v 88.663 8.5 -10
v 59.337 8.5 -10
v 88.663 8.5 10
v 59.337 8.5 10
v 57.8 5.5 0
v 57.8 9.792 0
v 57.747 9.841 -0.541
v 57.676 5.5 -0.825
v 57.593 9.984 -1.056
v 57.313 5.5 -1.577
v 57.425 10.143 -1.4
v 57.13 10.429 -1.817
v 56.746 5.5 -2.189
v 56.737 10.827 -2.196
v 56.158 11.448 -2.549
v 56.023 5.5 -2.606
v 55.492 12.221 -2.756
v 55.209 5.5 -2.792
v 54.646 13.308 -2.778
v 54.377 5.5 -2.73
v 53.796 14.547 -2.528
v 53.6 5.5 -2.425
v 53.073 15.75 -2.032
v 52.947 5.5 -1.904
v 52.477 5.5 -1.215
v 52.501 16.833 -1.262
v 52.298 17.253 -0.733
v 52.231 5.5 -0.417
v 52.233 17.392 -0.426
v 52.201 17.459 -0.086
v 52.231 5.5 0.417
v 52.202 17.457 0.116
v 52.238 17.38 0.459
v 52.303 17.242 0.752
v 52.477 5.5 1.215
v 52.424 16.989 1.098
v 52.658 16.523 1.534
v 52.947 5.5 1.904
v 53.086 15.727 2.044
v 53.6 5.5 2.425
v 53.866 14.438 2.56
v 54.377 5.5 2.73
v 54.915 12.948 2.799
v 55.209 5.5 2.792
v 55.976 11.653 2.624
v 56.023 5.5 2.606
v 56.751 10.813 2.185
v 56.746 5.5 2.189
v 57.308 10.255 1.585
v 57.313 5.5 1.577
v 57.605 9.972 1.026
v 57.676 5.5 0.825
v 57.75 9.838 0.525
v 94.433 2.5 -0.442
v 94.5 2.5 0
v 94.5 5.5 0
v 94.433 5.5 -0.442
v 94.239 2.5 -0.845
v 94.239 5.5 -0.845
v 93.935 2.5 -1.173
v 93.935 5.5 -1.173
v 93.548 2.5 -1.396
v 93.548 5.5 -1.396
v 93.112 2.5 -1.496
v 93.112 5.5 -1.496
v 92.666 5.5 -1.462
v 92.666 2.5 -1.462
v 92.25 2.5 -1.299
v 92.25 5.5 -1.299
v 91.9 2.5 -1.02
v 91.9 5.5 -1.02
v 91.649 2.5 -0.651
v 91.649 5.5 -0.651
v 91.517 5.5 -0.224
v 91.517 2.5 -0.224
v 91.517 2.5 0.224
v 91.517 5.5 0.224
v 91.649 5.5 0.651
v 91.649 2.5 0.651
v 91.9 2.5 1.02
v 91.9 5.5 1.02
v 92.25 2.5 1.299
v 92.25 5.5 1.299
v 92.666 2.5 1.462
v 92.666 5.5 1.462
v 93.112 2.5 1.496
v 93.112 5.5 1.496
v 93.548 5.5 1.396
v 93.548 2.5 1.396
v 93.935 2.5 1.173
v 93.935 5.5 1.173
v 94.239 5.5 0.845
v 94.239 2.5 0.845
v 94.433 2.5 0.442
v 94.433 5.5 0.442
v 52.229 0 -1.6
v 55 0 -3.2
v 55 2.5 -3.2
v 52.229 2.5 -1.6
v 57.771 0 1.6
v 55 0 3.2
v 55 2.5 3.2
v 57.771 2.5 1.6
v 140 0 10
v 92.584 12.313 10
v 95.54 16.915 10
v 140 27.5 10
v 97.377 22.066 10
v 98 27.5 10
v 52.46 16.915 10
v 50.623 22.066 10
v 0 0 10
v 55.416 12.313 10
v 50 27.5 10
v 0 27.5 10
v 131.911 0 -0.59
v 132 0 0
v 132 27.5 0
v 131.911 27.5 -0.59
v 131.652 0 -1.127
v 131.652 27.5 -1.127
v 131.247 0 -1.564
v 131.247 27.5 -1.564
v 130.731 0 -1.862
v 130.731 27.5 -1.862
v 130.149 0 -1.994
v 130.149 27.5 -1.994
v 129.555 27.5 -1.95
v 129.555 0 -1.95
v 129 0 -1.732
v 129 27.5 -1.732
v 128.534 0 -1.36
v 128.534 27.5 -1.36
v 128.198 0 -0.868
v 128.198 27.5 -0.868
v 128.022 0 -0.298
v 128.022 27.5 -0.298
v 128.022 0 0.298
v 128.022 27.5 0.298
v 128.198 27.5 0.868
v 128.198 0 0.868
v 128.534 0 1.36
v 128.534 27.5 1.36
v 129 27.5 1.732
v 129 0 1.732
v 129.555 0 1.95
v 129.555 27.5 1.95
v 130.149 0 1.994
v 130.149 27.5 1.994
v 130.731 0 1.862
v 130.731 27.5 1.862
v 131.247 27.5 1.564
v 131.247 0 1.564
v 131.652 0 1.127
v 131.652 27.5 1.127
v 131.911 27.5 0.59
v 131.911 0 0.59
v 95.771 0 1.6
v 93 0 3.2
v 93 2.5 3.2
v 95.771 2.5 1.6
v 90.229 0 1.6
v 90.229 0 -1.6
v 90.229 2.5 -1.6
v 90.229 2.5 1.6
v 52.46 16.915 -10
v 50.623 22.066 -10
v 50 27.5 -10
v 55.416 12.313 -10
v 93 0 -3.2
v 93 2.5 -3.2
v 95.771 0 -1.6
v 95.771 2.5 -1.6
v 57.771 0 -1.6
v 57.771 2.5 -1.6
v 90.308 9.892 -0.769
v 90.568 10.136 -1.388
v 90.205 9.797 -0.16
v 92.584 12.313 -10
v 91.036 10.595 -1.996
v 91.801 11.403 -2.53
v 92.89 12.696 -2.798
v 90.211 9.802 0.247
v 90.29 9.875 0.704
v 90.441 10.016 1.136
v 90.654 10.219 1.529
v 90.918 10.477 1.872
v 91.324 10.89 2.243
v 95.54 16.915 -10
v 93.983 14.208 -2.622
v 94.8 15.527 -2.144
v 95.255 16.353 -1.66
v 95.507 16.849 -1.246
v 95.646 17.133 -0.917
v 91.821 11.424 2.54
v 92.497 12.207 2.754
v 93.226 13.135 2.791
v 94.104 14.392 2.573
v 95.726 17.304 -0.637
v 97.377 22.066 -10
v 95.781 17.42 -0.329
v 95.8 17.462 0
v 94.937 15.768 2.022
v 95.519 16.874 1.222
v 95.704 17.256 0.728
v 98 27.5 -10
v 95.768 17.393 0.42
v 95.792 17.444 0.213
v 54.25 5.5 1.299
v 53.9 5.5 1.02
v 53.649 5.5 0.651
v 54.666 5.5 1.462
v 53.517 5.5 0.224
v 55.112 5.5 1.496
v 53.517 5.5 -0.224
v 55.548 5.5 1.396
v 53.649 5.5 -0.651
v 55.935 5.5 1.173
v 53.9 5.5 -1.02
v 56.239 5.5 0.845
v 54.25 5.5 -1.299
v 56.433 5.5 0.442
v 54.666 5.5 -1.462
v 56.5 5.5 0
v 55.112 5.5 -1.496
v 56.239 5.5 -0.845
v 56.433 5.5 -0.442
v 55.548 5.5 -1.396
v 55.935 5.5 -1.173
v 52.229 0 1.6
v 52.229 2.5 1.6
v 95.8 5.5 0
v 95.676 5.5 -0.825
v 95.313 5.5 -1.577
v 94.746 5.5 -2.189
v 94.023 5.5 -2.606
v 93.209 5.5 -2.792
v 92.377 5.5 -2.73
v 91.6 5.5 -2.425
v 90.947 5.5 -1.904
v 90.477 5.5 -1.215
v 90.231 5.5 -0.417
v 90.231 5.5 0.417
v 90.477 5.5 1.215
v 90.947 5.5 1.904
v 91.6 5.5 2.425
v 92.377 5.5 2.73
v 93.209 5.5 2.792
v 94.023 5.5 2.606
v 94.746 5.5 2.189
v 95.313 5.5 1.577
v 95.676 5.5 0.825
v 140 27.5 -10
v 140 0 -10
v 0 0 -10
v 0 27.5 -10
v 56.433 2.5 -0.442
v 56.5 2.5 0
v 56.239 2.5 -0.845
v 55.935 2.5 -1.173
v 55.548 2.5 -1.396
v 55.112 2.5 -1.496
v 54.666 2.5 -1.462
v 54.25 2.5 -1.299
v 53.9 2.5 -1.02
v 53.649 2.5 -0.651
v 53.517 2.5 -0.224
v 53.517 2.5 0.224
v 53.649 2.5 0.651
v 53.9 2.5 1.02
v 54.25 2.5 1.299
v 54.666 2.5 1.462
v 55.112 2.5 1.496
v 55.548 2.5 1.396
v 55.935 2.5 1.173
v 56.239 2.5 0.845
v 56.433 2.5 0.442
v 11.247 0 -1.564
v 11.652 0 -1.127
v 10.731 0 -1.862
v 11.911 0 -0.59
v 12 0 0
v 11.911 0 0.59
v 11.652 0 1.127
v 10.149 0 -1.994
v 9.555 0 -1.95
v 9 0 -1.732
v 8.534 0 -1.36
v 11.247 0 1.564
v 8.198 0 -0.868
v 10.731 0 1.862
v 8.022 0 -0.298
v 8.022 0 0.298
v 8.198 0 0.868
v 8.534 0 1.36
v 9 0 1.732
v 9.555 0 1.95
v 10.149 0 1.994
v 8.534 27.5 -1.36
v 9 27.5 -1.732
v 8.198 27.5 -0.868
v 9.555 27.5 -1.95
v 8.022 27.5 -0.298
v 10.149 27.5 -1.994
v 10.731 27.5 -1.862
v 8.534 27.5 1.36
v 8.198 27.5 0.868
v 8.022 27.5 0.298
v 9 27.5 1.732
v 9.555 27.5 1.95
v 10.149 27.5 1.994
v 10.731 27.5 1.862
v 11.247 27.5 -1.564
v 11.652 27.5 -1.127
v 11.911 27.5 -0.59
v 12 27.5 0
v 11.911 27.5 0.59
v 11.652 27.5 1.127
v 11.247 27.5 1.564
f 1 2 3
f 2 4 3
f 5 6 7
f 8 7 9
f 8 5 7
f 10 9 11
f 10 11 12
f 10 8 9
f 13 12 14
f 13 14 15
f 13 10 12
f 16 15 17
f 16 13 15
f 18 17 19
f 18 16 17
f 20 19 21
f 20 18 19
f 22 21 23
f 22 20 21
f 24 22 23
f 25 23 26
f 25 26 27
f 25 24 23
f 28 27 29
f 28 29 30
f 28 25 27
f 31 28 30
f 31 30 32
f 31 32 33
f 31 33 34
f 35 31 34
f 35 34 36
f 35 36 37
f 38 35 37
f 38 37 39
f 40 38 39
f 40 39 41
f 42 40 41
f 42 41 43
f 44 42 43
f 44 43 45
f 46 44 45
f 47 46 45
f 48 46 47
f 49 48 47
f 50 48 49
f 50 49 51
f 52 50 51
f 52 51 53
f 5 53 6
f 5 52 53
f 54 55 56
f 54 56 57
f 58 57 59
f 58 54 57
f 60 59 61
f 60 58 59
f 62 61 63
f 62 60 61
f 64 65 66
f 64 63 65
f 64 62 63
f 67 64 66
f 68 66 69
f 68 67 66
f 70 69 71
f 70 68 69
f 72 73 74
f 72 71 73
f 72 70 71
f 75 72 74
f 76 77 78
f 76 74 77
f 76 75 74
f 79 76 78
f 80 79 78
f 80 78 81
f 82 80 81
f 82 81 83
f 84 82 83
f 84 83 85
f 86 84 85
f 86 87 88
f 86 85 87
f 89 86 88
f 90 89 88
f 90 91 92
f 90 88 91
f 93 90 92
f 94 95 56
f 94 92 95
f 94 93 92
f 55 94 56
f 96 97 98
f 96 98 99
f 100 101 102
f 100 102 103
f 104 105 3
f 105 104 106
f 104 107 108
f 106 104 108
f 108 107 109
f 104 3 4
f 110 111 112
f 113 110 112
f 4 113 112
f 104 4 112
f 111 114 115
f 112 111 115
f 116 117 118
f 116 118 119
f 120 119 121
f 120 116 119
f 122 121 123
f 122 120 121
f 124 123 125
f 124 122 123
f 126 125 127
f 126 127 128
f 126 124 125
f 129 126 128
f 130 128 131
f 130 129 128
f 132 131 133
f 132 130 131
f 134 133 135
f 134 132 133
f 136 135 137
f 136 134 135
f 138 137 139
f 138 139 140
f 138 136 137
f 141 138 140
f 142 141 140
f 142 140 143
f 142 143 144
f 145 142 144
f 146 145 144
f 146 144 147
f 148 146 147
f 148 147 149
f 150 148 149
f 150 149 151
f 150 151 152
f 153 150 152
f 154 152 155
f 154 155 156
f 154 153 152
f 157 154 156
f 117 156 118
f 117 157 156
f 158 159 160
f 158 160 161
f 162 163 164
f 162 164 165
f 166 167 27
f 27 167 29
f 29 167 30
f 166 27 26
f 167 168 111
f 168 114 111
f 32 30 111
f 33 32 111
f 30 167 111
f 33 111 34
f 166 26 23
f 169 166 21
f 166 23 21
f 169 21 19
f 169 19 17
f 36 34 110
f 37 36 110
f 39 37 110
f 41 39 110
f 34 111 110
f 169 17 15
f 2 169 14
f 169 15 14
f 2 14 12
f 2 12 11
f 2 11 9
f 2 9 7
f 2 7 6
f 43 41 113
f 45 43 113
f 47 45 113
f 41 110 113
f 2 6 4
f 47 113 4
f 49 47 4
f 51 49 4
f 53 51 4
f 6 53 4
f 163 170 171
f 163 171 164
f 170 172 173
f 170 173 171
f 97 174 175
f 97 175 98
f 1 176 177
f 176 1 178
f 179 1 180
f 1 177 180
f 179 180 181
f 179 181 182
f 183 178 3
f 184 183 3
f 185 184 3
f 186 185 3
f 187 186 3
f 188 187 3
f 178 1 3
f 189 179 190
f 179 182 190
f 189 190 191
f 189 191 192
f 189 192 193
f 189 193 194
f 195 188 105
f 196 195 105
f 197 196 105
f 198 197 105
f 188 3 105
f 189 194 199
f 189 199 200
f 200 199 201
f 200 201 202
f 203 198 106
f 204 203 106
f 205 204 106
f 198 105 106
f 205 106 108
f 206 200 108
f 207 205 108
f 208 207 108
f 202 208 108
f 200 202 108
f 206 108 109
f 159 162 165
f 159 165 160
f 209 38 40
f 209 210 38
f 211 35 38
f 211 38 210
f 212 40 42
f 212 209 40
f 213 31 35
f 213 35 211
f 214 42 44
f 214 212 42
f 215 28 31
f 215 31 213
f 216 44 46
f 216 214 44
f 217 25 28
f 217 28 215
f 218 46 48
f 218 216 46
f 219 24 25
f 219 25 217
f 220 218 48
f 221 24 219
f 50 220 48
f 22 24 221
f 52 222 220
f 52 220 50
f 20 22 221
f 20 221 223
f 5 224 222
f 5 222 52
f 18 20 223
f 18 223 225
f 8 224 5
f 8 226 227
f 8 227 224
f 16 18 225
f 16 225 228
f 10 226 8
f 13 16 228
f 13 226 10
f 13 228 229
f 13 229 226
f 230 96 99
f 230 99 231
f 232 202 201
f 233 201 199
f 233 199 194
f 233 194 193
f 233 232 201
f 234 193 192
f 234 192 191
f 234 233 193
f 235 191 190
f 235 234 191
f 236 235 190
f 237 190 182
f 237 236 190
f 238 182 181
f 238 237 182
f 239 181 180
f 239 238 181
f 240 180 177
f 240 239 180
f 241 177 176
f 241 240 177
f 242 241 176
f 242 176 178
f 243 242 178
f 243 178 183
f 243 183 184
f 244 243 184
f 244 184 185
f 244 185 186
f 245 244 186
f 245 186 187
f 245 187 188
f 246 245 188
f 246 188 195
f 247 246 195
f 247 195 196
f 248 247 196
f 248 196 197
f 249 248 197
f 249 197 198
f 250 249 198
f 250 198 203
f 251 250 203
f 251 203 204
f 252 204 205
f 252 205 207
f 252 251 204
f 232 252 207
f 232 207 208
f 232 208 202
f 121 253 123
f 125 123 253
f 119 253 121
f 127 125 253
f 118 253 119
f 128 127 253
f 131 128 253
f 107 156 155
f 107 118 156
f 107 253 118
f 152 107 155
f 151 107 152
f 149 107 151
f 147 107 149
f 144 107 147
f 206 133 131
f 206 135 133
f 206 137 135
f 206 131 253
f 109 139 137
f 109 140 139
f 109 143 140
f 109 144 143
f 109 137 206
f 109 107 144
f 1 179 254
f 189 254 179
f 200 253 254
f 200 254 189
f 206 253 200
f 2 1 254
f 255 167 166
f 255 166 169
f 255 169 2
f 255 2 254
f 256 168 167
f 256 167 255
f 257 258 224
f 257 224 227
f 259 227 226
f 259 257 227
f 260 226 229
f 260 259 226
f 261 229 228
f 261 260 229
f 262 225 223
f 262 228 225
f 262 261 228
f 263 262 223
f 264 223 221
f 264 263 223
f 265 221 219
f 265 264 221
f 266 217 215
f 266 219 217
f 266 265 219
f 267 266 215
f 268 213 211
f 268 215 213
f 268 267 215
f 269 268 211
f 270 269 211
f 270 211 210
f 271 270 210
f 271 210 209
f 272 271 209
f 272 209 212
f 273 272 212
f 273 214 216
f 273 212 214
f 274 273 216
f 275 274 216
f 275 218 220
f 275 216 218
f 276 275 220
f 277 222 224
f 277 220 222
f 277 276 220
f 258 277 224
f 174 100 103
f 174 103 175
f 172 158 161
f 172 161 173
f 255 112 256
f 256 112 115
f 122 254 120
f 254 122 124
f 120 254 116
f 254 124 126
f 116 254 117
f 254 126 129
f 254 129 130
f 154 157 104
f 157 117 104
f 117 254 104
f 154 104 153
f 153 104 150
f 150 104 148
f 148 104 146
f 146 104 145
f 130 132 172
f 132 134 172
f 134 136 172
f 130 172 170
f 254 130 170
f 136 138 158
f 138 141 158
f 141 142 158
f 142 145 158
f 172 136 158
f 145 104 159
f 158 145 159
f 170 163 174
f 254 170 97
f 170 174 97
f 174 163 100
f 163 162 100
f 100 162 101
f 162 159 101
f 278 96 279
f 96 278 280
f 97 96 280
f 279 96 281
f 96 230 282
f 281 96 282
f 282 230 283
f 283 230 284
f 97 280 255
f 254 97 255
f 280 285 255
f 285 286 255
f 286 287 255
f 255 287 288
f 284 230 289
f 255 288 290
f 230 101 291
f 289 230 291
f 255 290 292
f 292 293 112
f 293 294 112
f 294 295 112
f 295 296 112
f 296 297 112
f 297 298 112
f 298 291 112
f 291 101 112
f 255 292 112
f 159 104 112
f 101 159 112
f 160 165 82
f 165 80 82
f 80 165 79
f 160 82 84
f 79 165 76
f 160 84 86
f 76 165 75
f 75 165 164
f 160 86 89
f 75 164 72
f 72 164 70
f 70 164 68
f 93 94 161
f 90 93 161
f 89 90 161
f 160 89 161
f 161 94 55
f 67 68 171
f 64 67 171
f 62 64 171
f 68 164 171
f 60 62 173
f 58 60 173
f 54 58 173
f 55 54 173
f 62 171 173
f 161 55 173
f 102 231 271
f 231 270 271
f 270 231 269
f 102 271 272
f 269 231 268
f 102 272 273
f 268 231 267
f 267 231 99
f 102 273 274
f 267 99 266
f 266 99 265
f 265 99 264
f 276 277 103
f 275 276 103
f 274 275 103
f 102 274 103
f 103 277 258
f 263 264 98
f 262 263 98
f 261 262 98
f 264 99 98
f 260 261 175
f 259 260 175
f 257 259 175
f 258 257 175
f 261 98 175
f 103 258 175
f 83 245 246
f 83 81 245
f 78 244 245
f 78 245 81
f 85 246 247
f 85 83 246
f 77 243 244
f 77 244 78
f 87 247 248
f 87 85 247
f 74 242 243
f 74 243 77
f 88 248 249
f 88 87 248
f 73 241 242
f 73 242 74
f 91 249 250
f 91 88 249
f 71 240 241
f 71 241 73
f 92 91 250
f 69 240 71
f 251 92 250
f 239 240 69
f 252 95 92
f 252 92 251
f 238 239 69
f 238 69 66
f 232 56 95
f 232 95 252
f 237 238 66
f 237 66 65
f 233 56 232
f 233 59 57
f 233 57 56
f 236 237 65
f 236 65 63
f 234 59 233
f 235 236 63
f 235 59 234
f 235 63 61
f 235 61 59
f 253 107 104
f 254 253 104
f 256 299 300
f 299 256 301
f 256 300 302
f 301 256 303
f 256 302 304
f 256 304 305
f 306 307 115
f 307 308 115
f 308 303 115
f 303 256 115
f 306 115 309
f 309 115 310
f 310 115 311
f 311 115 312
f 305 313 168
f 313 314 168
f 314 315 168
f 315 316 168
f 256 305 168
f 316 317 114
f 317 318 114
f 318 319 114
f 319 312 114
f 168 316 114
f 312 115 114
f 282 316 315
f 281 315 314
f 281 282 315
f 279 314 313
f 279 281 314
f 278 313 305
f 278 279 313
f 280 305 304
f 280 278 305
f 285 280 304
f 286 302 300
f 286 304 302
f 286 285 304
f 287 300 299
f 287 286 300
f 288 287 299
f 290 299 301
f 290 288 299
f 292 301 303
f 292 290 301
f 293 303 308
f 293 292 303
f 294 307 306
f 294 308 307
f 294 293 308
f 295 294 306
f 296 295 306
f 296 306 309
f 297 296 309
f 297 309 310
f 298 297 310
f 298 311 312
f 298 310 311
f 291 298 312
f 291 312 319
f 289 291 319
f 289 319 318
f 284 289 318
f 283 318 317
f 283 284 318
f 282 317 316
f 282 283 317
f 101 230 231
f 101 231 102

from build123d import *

# Parameters (mm, degrees)
PAD002_DEPTH              = 2.5
CYLINDER005_R             = 2.8
CYLINDER005_DEPTH         = 15
CYLINDER004_R             = 1.5
CYLINDER004_DEPTH         = 8.5
FUSION002_PLACEMENT_ANGLE = 90
PAD001_DEPTH              = 2.5
CYLINDER003_R             = 2.8
CYLINDER003_DEPTH         = 15
CYLINDER002_R             = 1.5
CYLINDER002_DEPTH         = 8.5
FUSION001_PLACEMENT_ANGLE = 90
CYLINDER001_R             = 2
CYLINDER001_DEPTH         = 27.5
CYLINDER_R                = 2
CYLINDER_DEPTH            = 27.5
PAD_DEPTH                 = 10


with BuildPart() as body002:
    # Sketch002 → Pad002 (new body)
    with BuildSketch(Plane.XY):
        Polygon((0, -3.2), (2.771281, -1.6), (2.771281, 1.6), (0, 3.2), (-2.771281, 1.6), (-2.771281, -1.6), align=None)
    extrude(amount=PAD002_DEPTH)


with BuildPart() as cylinder005:
    # Cylinder005 → Cylinder005 (new body)
    with BuildSketch(Plane.XY.offset(5.5)):
        Circle(CYLINDER005_R)
    extrude(amount=CYLINDER005_DEPTH)


with BuildPart() as fusion002:
    # Cylinder004 → Cylinder004 (new body)
    with BuildSketch(Plane.XY):
        Circle(CYLINDER004_R)
    extrude(amount=CYLINDER004_DEPTH)

    # Fusion002: union Body002, Cylinder005
    add(body002.part)
    add(cylinder005.part)


with BuildPart() as fusion002_1:
    # Fusion002 placement: moved
    add(fusion002.part.moved(Location((93, 0, 0))).rotate(Axis((93, 0, 0), (-1, 0, 0)), FUSION002_PLACEMENT_ANGLE))


with BuildPart() as body001:
    # Sketch001 → Pad001 (new body)
    with BuildSketch(Plane.XY):
        Polygon((0, -3.2), (2.771281, -1.6), (2.771281, 1.6), (0, 3.2), (-2.771281, 1.6), (-2.771281, -1.6), align=None)
    extrude(amount=PAD001_DEPTH)


with BuildPart() as cylinder003:
    # Cylinder003 → Cylinder003 (new body)
    with BuildSketch(Plane.XY.offset(5.5)):
        Circle(CYLINDER003_R)
    extrude(amount=CYLINDER003_DEPTH)


with BuildPart() as fusion003:
    # Cylinder002 → Cylinder002 (new body)
    with BuildSketch(Plane.XY):
        Circle(CYLINDER002_R)
    extrude(amount=CYLINDER002_DEPTH)

    # Fusion001: union Body001, Cylinder003
    add(body001.part)
    add(cylinder003.part)


with BuildPart() as fusion003_1:
    # Fusion001 placement: moved
    add(fusion003.part.moved(Location((55, 0, 0))).rotate(Axis((55, 0, 0), (-1, 0, 0)), FUSION001_PLACEMENT_ANGLE))

    # Fusion003: union Fusion002
    add(fusion002_1.part)


with BuildPart() as cylinder001:
    # Cylinder001 → Cylinder001 (new body)
    with BuildSketch(Plane(origin=(130, 0, 0), x_dir=(1, 0, 0), z_dir=(0, 1, 0))):
        Circle(CYLINDER001_R)
    extrude(amount=CYLINDER001_DEPTH)


with BuildPart() as fusion:
    # Cylinder → Cylinder (new body)
    with BuildSketch(Plane(origin=(10, 0, 0), x_dir=(1, 0, 0), z_dir=(0, 1, 0))):
        Circle(CYLINDER_R)
    extrude(amount=CYLINDER_DEPTH)

    # Fusion: union Cylinder001
    add(cylinder001.part)


with BuildPart() as cut001:
    # Sketch (on Sketch) → Pad (new body, symmetric)
    with BuildSketch(Plane.XY):
        with BuildLine():
            Line((140, 0), (0, 0))
            Line((0, 0), (0, 27.499991))
            Line((0, 27.499991), (50, 27.499991))
            ThreePointArc((50, 27.499991), (52.460398, 16.914843), (59.337122, 8.5))
            Line((59.337122, 8.5), (88.662878, 8.5))
            ThreePointArc((88.662878, 8.5), (95.539604, 16.914847), (98, 27.5))
            Line((140, 27.5), (98, 27.5))
            Line((140, 27.5), (140, 0))
        make_face()
    extrude(amount=PAD_DEPTH, both=True)

    # Cut: cut Fusion
    add(fusion.part, mode=Mode.SUBTRACT)

    # Cut001: cut Fusion003
    add(fusion003_1.part, mode=Mode.SUBTRACT)


solid = cut001.part
